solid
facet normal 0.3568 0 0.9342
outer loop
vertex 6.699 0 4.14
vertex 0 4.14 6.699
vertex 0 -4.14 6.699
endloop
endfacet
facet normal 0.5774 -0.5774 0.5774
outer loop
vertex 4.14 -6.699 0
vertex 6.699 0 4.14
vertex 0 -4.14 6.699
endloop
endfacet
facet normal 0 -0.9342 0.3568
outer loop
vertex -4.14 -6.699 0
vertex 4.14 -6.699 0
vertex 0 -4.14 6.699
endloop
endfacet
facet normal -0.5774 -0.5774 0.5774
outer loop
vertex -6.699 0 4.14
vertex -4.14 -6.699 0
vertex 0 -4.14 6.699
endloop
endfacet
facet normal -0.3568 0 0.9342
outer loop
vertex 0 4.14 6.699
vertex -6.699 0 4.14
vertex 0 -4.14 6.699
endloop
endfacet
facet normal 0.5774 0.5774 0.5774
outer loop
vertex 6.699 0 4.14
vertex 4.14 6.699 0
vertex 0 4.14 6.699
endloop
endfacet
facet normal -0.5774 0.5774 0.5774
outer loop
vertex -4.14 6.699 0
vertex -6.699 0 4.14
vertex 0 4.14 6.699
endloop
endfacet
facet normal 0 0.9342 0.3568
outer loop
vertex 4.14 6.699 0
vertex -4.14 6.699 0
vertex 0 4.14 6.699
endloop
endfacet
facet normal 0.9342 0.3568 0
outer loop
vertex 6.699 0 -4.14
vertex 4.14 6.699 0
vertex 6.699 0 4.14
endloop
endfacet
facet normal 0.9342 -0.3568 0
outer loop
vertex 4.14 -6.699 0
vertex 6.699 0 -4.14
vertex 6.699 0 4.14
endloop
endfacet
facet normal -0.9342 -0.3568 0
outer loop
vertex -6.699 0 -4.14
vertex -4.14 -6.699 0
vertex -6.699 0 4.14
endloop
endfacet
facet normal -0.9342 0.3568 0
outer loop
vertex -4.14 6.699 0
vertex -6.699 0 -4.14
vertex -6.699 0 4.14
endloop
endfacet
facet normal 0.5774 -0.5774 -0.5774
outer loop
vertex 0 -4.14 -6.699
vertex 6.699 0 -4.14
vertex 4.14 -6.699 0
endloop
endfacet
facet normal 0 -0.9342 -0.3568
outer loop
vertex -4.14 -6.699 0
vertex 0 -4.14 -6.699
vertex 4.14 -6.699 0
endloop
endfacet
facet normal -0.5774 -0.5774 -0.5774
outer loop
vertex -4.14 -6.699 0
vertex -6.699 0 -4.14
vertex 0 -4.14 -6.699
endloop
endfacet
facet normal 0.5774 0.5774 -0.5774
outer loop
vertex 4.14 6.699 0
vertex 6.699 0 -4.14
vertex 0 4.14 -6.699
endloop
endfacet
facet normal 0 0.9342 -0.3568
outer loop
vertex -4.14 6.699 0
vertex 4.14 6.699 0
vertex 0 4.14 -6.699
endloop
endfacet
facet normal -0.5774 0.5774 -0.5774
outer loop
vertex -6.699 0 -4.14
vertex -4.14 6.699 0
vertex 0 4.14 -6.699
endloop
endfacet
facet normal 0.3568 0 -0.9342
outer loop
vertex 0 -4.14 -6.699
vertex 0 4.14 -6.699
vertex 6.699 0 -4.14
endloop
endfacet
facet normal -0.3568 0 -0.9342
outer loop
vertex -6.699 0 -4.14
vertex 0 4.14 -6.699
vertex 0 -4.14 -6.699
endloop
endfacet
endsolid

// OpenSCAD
// file: ../maths_geodesic.scad
/*
	License: This code is placed in the public Domain
	Contributed By: Willliam A Adams
	August 2011
*/

// A couple of useful constants
Cpi = 3.14159;
Cphi = 1.61803399;
Cepsilon = 0.00000001;

 
// Function: clean
//
// Parameters:
//	n - A number that might be very close to zero
// Description:  
//	There are times when you want a very small number to 
// 	just be zero, instead of being that very small number.
//	This function will compare the number to an arbitrarily small 
//	number.  If it is smaller than the 'epsilon', then zero will be 
// 	returned.  Otherwise, the original number will be returned.
//

function clean(n) = (n < 0) ? ((n < -Cepsilon) ? n : 0) : 
	(n < Cepsilon) ? 0 : n; 

// Function: safediv
//
// Parameters
//	n - The numerator
//	d - The denominator
//
// Description:
//	Since division by zero is generally not a desirable thing, safediv
//	will return '0' whenever there is a division by zero.  Although this will
//	mask some erroneous division by zero errors, it is often the case
//	that you actually want this behavior.  So, it makes it convenient.
function safediv(n,d) = (d==0) ? 0 : n/d;


//==================================
// Degrees
//==================================

function DEGREES(radians) = (180/Cpi) * radians;

function RADIANS(degrees) = Cpi/180 * degrees;

function deg(deg, min=0, sec=0) = [deg, min, sec];

function deg_to_dec(d) = d[0] + d[1]/60 + d[2]/60/60;


//==================================
//  Spherical coordinates
//==================================

// create an instance of a spherical coordinate
// long - rotation around z -axis
// lat - latitude, starting at 0 == 'north pole'
// rad - distance from center
function sph(long, lat, rad=1) = [long, lat, rad];

// Convert spherical to cartesian
function sph_to_cart(s) = [
	clean(s[2]*sin(s[1])*cos(s[0])),  
	clean(s[2]*sin(s[1])*sin(s[0])),
	clean(s[2]*cos(s[1]))
	];

// Convert from cartesian to spherical
function sph_from_cart(c) = sph(
	atan2(c[1],c[0]), 
	atan2(sqrt(c[0]*c[0]+c[1]*c[1]), c[2]), 
	sqrt(c[0]*c[0]+c[1]*c[1]+c[2]*c[2])
	);

function sphu_from_cart(c, rad=1) = sph(
	atan2(c[1],c[0]), 
	atan2(sqrt(c[0]*c[0]+c[1]*c[1]), c[2]), 
	rad
	);

// compute the chord distance between two points on a sphere
function sph_dist(c1, c2) = sqrt(
	c1[2]*c1[2] + c2[2]*c2[2] - 
	2*c1[2]*c2[2]*
	((cos(c1[1])*cos(c2[1])) + cos(c1[0]-c2[0])*sin(c1[1])*sin(c2[1]))   
	);


//==========================================
//	Geodesic calculations
// 
//  Reference: Geodesic Math and How to Use It
//  By: Hugh Kenner
//  Second Paperback Edition (2003), p.74-75
//  http://www.amazon.com/Geodesic-Math-How-Hugh-Kenner/dp/0520239318
//
//  The book was used for reference, so if you want to check the math, 
//  you can plug in various numbers to various routines and see if you get
//  the same numbers in the book.
//
//  In general, there are enough routines here to implement the various
//  pieces necessary to make geodesic objects.
//==========================================

function poly_sum_interior_angles(sides) = (sides-2)*180;
function poly_single_interior_angle(pq) = poly_sum_interior_angles(pq[0])/pq[0];



// Given a set of coordinates, return the frequency
// Simply calculated by adding up the values of the coordinates
function geo_freq(xyz) = xyz[0]+xyz[1]+xyz[2];

// Convert between the 2D coordinates of vertices on the face triangle
// to the 3D vertices needed to calculate spherical coordinates
function geo_tri2_tri3(xyf) = [xyf[1], xyf[0]-xyf[1], xyf[2]-xyf[0]];

// Given coordinates for a vertex on the octahedron face
// return the spherical coordinates for the vertex
// class 1, method 1
function octa_class1(c) = sph(
	atan(safediv(c[0], c[1])),
	atan(sqrt(c[0]*c[0]+c[1]*c[1])/c[2]),
	1 
	);

function octa_class2(c) = sph(
	atan(c[0]/c[1]),
	atan( sqrt( 2*(c[0]*c[0]+c[1]*c[1])) /c[2]),
	1 
	);

function icosa_class1(c) = octa_class1(
	[
		c[0]*sin(72),  
		c[1]+c[0]*cos(72),  
		geo_freq(c)/2+c[2]/Cphi
	]);

function icosa_class2(c) = sph(
	atan([c0]/c[1]), 
	atan(sqrt(c[0]*c[0]+c[1]*c[1]))/cos(36)*c[2],
	1
	);
 
function tetra_class1(c) = octa_class1(
	[
		sqrt(3*c[0]),  
		2*c[1]-c[0],  
		(3*c[2]-c[0]-c[1])/sqrt(2)
	]);

function class1_icosa_chord_factor(v1, v2, freq) = sph_dist( 
		icosa_class1(geo_tri2_tri3( [v1[0], v1[1], freq])),
		icosa_class1(geo_tri2_tri3( [v2[0], v2[1], freq]))
	);
// main file
// file autogenerated by platonicSTLgen
// author: thanasi athanassiadis (thanasi@uchicago.edu)
// script dated: august 25, 2012

include <../platonic.scad>

// units are mm

rad = 7.875331;

poly = icosahedron(rad);

for(i = [ [0.000000,0.000000,0.000000] ])
{
    translate(i)
    display_polyhedron(poly);
}

module display_polyhedron(poly) 
{
polyhedron(points = poly[0], triangles = poly[1]);
}
